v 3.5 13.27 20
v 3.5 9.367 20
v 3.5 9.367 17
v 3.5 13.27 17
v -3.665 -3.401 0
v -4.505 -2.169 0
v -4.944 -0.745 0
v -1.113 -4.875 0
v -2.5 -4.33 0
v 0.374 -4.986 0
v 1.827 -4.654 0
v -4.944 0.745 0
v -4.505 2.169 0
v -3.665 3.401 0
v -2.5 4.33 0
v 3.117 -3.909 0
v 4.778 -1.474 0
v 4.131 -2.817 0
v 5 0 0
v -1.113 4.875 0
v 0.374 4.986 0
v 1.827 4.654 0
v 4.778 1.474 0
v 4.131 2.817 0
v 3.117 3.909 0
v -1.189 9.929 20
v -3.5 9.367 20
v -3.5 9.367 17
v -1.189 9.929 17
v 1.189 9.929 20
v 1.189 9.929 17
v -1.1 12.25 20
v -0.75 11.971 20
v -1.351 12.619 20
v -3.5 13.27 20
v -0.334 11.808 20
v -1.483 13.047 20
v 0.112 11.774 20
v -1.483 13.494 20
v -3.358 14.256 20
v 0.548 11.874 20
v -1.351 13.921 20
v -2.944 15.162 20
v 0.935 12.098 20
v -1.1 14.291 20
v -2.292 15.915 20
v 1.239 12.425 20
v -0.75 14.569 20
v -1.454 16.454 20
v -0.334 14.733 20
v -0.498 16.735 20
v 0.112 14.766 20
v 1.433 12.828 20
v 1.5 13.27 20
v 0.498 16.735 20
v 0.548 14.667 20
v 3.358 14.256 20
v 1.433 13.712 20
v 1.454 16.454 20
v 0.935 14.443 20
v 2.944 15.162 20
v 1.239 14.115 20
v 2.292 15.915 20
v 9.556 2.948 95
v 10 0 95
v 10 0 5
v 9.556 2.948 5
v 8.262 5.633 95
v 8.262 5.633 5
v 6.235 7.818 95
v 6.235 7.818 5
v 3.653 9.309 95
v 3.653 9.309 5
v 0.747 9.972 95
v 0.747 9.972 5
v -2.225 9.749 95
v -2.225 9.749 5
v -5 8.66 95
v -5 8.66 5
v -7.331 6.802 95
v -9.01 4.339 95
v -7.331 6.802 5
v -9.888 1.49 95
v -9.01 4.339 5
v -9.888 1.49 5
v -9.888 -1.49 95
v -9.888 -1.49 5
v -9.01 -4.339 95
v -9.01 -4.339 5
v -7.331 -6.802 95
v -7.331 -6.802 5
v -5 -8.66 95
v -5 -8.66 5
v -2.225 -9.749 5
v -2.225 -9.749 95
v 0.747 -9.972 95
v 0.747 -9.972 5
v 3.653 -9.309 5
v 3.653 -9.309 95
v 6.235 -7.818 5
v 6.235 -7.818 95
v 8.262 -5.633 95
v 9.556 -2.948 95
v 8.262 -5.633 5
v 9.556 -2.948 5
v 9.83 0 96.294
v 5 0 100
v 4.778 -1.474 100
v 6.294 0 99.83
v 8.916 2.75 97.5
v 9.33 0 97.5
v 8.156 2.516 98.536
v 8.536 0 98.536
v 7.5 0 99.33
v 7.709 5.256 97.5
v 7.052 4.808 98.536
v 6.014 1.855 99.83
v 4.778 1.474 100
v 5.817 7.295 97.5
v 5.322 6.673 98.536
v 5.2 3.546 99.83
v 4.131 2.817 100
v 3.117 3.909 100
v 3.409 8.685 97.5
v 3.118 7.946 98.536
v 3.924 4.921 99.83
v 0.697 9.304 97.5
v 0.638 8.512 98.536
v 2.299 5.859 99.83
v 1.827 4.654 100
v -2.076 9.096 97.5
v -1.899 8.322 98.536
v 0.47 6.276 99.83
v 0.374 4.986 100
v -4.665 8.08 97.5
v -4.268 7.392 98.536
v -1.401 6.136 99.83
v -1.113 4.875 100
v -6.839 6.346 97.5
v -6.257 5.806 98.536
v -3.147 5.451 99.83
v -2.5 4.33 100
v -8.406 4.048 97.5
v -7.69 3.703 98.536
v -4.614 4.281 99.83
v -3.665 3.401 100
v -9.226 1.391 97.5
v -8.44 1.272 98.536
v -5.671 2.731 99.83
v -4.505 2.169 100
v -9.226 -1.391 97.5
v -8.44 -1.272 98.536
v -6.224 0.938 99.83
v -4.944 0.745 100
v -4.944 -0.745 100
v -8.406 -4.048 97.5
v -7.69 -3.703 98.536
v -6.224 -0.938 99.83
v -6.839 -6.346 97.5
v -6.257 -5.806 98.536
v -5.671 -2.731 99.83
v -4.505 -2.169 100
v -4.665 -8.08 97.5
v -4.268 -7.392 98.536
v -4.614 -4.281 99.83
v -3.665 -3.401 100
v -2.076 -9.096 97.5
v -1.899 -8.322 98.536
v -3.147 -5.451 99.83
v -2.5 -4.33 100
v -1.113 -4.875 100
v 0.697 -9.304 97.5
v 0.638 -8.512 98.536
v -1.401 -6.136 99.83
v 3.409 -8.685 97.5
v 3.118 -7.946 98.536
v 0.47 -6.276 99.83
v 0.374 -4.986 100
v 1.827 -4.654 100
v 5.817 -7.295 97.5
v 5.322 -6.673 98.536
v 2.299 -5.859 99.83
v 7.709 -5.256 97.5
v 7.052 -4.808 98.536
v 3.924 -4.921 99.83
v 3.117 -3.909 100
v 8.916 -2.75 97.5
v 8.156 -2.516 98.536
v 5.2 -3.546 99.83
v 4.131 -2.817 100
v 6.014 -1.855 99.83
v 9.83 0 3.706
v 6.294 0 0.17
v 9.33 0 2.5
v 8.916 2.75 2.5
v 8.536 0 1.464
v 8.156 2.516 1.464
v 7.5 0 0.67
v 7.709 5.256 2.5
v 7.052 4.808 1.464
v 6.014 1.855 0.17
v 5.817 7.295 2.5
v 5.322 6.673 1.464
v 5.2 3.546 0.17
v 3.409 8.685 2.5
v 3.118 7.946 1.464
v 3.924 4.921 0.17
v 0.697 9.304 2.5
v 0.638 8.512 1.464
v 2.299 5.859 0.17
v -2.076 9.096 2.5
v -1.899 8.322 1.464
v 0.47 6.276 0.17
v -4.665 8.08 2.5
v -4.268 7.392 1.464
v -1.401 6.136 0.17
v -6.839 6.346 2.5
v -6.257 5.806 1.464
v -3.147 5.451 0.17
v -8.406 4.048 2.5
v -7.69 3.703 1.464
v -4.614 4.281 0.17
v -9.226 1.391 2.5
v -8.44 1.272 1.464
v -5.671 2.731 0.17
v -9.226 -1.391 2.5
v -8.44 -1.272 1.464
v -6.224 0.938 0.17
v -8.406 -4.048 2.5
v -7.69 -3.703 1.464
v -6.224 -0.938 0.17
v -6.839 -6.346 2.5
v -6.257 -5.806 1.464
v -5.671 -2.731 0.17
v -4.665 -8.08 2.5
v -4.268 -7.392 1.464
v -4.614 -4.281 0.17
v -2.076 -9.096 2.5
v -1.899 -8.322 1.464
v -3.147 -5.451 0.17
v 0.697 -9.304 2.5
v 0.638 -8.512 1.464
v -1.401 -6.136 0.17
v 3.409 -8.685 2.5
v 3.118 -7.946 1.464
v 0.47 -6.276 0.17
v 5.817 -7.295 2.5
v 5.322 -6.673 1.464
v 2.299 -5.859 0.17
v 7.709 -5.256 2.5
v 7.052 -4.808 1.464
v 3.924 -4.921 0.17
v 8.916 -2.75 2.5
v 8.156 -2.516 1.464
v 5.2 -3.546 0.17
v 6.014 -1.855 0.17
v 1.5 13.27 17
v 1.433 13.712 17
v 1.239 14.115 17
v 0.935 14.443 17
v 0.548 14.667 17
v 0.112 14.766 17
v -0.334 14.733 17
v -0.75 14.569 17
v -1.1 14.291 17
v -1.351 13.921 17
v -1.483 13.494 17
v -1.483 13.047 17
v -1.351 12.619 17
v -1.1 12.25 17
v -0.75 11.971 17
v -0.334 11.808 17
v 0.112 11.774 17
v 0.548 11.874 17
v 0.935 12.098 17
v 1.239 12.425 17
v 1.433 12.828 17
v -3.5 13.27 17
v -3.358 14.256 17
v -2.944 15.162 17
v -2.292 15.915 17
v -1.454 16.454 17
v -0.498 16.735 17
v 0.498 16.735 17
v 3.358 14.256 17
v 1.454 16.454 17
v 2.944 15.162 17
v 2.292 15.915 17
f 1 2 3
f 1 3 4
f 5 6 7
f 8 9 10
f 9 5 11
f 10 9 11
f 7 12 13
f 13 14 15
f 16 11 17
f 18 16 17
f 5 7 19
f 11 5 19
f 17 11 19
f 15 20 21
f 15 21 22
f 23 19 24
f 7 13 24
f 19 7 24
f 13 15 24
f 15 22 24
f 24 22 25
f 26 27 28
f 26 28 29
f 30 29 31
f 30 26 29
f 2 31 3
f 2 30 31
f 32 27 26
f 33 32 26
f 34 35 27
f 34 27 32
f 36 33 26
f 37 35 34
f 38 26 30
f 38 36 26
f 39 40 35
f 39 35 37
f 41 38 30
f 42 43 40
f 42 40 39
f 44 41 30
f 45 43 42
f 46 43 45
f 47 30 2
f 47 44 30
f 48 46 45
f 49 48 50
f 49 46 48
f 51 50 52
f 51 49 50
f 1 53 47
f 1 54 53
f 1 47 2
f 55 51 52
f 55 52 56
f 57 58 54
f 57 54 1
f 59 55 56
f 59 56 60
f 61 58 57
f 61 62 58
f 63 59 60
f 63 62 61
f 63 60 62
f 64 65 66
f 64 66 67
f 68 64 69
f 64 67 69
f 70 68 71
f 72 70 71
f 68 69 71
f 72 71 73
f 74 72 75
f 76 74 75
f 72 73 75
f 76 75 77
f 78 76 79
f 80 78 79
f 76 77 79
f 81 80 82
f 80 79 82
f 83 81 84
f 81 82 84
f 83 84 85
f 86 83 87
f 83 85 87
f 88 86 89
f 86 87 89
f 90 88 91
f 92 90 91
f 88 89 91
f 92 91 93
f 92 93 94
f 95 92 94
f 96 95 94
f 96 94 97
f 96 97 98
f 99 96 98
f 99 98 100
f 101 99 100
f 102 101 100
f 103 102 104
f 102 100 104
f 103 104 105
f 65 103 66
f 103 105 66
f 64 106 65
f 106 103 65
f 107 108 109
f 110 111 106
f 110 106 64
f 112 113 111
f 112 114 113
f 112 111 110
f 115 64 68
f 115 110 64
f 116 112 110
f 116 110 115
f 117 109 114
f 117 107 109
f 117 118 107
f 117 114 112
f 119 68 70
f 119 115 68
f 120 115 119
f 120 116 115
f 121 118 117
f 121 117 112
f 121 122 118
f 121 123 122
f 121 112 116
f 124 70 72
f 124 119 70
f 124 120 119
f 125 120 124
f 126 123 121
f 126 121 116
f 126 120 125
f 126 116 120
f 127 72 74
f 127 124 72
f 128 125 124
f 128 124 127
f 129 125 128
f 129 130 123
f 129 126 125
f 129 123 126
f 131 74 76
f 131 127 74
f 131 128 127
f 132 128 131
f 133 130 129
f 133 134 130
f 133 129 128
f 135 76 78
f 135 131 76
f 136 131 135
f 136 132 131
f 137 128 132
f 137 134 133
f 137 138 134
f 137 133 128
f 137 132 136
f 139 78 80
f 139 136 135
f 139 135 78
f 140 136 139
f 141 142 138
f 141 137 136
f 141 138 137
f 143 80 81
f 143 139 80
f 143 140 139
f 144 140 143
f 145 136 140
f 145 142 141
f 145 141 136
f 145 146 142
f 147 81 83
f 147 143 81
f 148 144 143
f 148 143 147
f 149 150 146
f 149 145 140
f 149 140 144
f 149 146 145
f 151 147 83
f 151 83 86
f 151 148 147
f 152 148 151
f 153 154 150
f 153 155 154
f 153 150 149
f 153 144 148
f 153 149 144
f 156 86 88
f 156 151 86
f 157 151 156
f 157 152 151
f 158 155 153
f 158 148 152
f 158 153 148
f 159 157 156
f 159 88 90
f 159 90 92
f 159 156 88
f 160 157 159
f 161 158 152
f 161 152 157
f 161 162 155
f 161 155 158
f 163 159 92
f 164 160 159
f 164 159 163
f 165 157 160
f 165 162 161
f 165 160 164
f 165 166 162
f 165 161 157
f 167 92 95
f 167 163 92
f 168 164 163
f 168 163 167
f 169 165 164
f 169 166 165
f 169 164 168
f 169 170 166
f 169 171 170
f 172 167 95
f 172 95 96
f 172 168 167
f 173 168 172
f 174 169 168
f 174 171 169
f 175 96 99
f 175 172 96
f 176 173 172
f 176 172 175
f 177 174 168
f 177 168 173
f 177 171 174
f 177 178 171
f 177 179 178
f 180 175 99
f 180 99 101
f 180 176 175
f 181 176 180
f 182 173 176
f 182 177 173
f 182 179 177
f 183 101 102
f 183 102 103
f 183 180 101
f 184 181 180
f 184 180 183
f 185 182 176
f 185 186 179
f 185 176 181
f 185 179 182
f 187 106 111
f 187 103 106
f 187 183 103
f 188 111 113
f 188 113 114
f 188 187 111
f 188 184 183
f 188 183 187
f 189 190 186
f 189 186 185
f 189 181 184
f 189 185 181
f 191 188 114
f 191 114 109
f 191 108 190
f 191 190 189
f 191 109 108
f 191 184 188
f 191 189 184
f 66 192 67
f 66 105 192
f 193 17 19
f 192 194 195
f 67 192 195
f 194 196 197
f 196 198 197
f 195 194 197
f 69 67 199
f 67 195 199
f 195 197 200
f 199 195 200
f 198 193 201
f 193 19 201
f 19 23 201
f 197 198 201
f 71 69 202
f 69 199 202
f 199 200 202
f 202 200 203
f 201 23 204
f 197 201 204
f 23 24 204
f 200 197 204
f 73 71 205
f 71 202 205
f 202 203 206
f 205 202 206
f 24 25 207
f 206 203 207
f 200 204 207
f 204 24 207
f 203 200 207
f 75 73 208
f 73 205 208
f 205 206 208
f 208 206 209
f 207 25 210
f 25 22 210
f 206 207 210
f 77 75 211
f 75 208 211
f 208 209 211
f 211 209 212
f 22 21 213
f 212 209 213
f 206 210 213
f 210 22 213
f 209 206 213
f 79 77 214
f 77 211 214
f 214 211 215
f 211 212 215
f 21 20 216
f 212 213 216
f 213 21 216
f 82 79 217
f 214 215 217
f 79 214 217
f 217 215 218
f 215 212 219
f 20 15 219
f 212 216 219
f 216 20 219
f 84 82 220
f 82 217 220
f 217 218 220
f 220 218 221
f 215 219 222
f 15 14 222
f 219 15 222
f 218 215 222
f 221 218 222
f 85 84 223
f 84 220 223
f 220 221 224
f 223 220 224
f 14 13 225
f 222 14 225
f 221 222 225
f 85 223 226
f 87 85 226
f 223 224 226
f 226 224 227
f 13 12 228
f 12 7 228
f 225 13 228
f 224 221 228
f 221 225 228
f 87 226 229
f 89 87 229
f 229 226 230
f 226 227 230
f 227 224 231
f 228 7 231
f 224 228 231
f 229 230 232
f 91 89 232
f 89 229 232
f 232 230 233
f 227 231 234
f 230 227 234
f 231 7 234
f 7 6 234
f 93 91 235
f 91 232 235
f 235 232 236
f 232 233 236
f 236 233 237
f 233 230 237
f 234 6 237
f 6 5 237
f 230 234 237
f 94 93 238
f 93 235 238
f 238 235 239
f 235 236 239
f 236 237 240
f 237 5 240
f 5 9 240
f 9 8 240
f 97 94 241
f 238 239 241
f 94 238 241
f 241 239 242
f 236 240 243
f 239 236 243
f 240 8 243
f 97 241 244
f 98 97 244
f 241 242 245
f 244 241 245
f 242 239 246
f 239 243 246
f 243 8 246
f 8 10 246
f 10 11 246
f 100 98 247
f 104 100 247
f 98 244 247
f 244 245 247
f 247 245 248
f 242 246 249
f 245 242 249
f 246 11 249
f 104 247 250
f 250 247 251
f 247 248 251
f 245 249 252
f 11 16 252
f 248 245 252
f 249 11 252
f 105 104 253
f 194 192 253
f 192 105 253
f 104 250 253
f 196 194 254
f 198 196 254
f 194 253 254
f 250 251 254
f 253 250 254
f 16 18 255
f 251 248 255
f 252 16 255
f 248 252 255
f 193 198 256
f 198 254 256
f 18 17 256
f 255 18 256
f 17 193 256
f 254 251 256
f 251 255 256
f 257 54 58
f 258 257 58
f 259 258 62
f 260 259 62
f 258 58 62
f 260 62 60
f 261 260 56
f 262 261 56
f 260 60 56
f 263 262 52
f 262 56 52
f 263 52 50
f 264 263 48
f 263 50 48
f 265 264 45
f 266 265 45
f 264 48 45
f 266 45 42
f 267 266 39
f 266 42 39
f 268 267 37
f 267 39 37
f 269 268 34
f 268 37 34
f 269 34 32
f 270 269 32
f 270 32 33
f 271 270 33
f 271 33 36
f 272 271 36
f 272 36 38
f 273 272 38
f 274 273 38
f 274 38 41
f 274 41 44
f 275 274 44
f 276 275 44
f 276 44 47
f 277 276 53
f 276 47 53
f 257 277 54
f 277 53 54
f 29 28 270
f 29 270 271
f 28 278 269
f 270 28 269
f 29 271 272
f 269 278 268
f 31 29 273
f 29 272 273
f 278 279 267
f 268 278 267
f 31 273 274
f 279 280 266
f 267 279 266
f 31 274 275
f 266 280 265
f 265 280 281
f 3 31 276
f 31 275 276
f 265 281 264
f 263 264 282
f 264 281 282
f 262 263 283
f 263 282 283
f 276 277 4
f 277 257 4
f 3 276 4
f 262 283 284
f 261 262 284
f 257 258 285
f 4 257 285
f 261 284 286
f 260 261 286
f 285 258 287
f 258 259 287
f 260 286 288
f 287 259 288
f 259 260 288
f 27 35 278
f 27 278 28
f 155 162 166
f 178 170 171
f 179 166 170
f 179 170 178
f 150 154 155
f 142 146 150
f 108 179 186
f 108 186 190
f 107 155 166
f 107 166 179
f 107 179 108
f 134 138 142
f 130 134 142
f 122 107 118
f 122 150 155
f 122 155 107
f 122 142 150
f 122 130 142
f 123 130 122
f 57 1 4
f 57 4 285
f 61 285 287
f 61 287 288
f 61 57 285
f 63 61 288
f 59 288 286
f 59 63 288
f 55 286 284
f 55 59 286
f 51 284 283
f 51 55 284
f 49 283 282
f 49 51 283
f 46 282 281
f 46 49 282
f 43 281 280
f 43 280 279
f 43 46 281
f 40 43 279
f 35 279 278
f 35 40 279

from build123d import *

# Parameters (mm, degrees)
SKETCH1_R           = 10
BOSS_EXTRUDE1_DEPTH = 100
FILLET1_R           = 5
SKETCH2_R           = 1.5
BOSS_EXTRUDE2_DEPTH = 3


with BuildPart() as part:
    # Sketch1 → Boss-Extrude1 (new body)
    with BuildSketch(Plane.XY):
        Circle(SKETCH1_R)
    extrude(amount=BOSS_EXTRUDE1_DEPTH)

    # Fillet1
    fillet1_edges = [part.edges().sort_by_distance(p)[0] for p in [
        (-10, 0, 0),
        (-10, 0, 100),
    ]]
    fillet(fillet1_edges, radius=FILLET1_R)


with BuildPart() as body_2:
    # Sketch2 → Boss-Extrude2 (new body)
    with BuildSketch(Plane.XY.offset(20)):
        with BuildLine():
            Line((3.5, 9.367496998), (3.5, 13.270248109))
            ThreePointArc((3.5, 13.270248109), (0, 16.770248109), (-3.5, 13.270248109))
            Line((-3.5, 13.270248109), (-3.5, 9.367496998))
            ThreePointArc((-3.5, 9.367496998), (0, 10), (3.5, 9.367496998))
        make_face()
        with Locations((0, 13.270248109)):
            Circle(SKETCH2_R, mode=Mode.SUBTRACT)
    extrude(amount=-BOSS_EXTRUDE2_DEPTH)


solid = Compound([part.part, body_2.part])
